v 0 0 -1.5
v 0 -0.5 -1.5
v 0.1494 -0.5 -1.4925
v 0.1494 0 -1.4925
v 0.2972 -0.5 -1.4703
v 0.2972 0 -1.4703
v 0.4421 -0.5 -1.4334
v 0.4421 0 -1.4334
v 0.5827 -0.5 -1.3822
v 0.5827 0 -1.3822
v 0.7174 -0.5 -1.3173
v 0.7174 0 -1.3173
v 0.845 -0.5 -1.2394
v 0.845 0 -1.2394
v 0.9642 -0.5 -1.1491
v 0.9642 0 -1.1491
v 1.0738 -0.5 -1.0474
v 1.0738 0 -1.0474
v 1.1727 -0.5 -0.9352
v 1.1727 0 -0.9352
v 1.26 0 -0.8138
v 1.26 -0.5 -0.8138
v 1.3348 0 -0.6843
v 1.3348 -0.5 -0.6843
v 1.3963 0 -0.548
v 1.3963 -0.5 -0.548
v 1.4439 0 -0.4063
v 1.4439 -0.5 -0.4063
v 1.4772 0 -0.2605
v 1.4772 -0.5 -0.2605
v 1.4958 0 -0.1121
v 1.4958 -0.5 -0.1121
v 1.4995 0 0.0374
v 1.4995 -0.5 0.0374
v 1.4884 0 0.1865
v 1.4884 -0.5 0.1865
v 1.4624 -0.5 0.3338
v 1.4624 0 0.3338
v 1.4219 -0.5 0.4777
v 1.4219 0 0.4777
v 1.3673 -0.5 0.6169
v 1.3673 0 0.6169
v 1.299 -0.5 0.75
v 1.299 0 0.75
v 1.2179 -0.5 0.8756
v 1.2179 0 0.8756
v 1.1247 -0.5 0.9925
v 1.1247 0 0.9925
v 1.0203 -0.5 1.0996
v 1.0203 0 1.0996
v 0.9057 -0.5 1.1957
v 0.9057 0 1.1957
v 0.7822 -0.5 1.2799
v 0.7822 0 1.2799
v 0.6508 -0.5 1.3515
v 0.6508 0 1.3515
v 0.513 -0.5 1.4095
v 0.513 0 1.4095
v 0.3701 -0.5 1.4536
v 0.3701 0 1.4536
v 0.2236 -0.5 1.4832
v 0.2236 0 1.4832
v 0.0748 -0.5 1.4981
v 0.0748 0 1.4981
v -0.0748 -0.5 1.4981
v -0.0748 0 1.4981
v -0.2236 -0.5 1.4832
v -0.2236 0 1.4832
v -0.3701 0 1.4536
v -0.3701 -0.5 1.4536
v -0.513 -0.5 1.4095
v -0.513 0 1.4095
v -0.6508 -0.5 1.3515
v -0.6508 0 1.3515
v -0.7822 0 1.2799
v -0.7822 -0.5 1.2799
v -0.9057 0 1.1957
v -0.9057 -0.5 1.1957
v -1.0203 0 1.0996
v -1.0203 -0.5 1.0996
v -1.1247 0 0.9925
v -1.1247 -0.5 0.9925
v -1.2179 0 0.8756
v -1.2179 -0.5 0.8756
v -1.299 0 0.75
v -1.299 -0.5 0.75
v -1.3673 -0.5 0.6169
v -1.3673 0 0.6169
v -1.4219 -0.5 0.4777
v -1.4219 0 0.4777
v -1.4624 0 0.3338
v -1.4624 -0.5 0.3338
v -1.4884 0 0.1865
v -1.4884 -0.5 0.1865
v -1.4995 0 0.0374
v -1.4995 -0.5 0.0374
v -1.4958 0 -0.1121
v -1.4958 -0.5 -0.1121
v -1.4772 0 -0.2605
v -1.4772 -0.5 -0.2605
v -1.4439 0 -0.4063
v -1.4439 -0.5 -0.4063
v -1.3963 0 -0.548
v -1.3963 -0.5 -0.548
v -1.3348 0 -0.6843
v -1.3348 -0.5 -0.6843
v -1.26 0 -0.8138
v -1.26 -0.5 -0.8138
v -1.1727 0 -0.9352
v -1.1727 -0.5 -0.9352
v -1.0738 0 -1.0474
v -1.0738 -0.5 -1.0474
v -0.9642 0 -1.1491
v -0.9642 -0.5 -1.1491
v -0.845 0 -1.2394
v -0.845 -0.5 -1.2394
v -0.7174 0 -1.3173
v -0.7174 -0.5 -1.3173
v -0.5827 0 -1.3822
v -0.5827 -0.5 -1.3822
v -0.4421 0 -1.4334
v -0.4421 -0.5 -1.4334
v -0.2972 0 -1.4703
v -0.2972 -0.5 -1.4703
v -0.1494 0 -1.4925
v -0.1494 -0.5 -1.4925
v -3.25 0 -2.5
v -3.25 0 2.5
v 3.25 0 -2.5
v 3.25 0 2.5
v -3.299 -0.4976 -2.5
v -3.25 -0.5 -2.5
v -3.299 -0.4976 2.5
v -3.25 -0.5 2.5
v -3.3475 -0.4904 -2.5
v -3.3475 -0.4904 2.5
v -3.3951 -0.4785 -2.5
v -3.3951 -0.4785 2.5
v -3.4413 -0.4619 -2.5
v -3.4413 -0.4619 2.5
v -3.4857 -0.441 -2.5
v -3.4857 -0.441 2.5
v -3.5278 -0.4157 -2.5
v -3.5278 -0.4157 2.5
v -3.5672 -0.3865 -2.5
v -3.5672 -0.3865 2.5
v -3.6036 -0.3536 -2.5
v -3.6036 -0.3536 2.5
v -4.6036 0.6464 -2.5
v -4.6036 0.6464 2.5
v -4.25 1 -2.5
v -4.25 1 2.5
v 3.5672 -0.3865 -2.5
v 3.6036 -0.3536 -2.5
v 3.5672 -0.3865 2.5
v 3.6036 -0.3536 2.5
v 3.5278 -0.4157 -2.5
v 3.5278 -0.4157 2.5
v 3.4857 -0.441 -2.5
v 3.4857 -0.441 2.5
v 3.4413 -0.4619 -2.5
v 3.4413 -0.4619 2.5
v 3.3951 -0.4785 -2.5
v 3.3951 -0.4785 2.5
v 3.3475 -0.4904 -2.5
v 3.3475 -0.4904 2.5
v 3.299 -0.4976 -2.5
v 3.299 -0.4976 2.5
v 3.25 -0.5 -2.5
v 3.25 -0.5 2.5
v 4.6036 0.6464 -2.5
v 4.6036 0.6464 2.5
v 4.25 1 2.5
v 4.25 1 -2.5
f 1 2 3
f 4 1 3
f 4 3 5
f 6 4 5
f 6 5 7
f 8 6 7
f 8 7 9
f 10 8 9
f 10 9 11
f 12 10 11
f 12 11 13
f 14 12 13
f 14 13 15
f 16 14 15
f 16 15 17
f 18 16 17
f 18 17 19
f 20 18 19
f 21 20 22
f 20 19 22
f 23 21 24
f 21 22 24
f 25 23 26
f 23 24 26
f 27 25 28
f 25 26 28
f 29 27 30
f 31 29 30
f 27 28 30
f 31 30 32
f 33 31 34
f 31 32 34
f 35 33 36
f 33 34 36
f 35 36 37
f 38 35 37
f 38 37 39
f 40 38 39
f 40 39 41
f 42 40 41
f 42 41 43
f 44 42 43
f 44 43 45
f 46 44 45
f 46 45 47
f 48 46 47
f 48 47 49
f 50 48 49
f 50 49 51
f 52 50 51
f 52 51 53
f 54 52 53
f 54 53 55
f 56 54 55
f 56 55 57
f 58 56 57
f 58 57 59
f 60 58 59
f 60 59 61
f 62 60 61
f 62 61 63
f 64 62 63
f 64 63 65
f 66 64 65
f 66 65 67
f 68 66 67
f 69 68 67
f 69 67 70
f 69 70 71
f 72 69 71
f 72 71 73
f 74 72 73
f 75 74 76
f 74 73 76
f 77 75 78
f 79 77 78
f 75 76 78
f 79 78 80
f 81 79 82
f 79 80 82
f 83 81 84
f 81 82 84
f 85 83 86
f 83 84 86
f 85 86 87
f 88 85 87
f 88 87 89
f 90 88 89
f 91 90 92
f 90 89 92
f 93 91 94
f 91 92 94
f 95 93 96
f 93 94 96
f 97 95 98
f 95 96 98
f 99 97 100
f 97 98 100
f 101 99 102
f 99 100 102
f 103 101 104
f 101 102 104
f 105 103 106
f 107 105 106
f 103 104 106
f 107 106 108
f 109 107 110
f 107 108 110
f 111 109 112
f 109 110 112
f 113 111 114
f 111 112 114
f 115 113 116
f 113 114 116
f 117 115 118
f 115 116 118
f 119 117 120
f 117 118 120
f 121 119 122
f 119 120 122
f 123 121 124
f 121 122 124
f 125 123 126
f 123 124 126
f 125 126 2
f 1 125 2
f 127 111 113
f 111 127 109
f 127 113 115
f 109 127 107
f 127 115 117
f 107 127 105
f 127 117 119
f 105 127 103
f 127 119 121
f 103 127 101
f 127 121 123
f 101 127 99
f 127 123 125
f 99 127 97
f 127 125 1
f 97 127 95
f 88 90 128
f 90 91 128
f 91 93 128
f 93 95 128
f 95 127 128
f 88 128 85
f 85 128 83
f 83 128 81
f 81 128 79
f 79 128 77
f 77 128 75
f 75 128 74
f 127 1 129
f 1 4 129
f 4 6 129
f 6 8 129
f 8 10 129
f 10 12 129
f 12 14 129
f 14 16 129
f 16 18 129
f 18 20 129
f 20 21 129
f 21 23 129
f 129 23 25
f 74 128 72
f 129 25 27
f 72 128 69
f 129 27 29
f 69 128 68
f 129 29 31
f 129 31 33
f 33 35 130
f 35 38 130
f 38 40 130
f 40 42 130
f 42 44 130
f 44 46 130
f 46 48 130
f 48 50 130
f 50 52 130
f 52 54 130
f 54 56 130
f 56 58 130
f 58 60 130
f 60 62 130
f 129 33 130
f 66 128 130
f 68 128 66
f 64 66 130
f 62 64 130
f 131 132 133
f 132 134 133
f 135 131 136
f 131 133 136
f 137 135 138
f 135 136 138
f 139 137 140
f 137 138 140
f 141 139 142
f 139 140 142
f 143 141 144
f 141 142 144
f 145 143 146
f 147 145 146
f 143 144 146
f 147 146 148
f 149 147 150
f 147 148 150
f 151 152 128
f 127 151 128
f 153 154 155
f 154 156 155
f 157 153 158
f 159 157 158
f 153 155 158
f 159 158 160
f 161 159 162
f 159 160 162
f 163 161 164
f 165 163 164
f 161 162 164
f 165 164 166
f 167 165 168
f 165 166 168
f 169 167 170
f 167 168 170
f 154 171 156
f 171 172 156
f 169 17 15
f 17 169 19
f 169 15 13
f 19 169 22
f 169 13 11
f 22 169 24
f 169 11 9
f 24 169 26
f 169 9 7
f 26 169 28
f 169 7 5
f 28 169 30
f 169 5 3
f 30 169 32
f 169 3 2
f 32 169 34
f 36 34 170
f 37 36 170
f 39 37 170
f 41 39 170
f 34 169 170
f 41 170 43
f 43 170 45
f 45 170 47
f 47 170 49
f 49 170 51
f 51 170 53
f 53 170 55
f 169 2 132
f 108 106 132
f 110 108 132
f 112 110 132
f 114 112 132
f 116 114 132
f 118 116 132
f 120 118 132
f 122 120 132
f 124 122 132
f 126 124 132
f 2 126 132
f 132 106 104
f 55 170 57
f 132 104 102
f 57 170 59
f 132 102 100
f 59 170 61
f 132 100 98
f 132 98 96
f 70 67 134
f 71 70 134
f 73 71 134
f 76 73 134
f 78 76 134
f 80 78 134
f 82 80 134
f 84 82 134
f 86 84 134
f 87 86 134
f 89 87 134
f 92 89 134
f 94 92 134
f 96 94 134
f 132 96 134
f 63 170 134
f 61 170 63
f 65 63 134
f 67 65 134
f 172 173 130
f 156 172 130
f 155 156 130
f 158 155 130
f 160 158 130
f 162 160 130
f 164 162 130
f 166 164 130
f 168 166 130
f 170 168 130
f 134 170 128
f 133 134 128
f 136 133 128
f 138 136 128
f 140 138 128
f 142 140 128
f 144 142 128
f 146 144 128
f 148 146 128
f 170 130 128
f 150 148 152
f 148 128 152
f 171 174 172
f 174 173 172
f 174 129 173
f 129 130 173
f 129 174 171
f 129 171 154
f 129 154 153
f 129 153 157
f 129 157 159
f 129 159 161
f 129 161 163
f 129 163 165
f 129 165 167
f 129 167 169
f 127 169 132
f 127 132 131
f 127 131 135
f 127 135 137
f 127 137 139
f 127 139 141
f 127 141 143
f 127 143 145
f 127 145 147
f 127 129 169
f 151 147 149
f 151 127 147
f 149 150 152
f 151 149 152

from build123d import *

# Parameters (mm, degrees)
BOSS_EXTRUDE1_DEPTH = 2.5
SKETCH2_R           = 1.5
CUT_EXTRUDE1_DEPTH  = 5


with BuildPart() as part:
    # Sketch1 → Boss-Extrude1 (new, symmetric)
    with BuildSketch(Plane.XY):
        with BuildLine():
            Line((-3.25, 0), (3.25, 0))
            Line((3.25, 0), (4.25, 1))
            Line((4.25, 1), (4.603553391, 0.646446609))
            Line((4.603553391, 0.646446609), (3.603553391, -0.353553391))
            ThreePointArc((3.603553391, -0.353553391), (3.441341716, -0.461939766), (3.25, -0.5))
            Line((3.25, -0.5), (-3.25, -0.5))
            ThreePointArc((-3.25, -0.5), (-3.441341716, -0.461939766), (-3.603553391, -0.353553391))
            Line((-3.603553391, -0.353553391), (-4.603553391, 0.646446609))
            Line((-4.603553391, 0.646446609), (-4.25, 1))
            Line((-4.25, 1), (-3.25, 0))
        make_face()
    extrude(amount=BOSS_EXTRUDE1_DEPTH, both=True)

    # Sketch2 → Cut-Extrude1 (cut)
    with BuildSketch(Plane.XZ.offset(0.5)):
        with Locations(Location((0, 0, 0), (0, 0, 270))):
            Circle(SKETCH2_R)
    extrude(amount=-CUT_EXTRUDE1_DEPTH, mode=Mode.SUBTRACT)


solid = part.part
